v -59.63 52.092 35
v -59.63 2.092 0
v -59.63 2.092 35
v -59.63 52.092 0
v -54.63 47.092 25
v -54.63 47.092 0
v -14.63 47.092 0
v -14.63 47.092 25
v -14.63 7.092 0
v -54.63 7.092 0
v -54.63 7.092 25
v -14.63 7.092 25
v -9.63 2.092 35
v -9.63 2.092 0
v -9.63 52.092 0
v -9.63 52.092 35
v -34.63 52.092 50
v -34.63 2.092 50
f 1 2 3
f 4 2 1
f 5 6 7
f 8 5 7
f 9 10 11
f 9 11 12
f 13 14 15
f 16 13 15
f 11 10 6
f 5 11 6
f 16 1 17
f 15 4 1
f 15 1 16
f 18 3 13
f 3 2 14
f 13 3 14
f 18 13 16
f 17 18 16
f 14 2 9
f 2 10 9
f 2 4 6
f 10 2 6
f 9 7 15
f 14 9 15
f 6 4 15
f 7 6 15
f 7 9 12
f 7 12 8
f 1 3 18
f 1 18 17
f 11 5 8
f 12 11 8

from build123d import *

# Parameters (mm, degrees)
F0_W     = 50
F0_H     = 50
F0_W_2   = 40
F0_H_2   = 40
F1_DEPTH = 25
F2_W     = 50
F2_H     = 50
F3_DEPTH = 25
F4_SIZE2 = 14.99999
F4_SIZE  = 24.99999


# Not quite as in the source:
# - a fillet or chamfer is up to 0.001 mm smaller than in the source, because OpenCascade refuses the exact size


with BuildPart() as f1:
    # F0 (on Top) → F1 (new body)
    with BuildSketch(Plane.XY):
        with Locations((-34.6303719711, 27.0920880139)):
            Rectangle(F0_W, F0_H)
        with Locations((-34.6303719711, 27.0920880139)):
            Rectangle(F0_W_2, F0_H_2, mode=Mode.SUBTRACT)
    extrude(amount=F1_DEPTH)

    # F2 (on face) → F3 (join)
    with BuildSketch(Plane.XY.offset(25)):
        with Locations((-34.6303719711, 27.0920880139)):
            Rectangle(F2_W, F2_H)
    extrude(amount=F3_DEPTH)

    # F4 (size 25 and 15 in the source; OpenCascade refuses exactly that, so slightly less here)
    f4_edges = [f1.edges().sort_by_distance(p)[0] for p in [
        (-59.630372, 27.092088, 50),
        (-9.630372, 27.092088, 50),
    ]]
    f4_side = f1.faces().sort_by_distance((-34.630372, 27.092088, 50))[0]
    chamfer(f4_edges, length=F4_SIZE, length2=F4_SIZE2, reference=f4_side)


solid = f1.part
